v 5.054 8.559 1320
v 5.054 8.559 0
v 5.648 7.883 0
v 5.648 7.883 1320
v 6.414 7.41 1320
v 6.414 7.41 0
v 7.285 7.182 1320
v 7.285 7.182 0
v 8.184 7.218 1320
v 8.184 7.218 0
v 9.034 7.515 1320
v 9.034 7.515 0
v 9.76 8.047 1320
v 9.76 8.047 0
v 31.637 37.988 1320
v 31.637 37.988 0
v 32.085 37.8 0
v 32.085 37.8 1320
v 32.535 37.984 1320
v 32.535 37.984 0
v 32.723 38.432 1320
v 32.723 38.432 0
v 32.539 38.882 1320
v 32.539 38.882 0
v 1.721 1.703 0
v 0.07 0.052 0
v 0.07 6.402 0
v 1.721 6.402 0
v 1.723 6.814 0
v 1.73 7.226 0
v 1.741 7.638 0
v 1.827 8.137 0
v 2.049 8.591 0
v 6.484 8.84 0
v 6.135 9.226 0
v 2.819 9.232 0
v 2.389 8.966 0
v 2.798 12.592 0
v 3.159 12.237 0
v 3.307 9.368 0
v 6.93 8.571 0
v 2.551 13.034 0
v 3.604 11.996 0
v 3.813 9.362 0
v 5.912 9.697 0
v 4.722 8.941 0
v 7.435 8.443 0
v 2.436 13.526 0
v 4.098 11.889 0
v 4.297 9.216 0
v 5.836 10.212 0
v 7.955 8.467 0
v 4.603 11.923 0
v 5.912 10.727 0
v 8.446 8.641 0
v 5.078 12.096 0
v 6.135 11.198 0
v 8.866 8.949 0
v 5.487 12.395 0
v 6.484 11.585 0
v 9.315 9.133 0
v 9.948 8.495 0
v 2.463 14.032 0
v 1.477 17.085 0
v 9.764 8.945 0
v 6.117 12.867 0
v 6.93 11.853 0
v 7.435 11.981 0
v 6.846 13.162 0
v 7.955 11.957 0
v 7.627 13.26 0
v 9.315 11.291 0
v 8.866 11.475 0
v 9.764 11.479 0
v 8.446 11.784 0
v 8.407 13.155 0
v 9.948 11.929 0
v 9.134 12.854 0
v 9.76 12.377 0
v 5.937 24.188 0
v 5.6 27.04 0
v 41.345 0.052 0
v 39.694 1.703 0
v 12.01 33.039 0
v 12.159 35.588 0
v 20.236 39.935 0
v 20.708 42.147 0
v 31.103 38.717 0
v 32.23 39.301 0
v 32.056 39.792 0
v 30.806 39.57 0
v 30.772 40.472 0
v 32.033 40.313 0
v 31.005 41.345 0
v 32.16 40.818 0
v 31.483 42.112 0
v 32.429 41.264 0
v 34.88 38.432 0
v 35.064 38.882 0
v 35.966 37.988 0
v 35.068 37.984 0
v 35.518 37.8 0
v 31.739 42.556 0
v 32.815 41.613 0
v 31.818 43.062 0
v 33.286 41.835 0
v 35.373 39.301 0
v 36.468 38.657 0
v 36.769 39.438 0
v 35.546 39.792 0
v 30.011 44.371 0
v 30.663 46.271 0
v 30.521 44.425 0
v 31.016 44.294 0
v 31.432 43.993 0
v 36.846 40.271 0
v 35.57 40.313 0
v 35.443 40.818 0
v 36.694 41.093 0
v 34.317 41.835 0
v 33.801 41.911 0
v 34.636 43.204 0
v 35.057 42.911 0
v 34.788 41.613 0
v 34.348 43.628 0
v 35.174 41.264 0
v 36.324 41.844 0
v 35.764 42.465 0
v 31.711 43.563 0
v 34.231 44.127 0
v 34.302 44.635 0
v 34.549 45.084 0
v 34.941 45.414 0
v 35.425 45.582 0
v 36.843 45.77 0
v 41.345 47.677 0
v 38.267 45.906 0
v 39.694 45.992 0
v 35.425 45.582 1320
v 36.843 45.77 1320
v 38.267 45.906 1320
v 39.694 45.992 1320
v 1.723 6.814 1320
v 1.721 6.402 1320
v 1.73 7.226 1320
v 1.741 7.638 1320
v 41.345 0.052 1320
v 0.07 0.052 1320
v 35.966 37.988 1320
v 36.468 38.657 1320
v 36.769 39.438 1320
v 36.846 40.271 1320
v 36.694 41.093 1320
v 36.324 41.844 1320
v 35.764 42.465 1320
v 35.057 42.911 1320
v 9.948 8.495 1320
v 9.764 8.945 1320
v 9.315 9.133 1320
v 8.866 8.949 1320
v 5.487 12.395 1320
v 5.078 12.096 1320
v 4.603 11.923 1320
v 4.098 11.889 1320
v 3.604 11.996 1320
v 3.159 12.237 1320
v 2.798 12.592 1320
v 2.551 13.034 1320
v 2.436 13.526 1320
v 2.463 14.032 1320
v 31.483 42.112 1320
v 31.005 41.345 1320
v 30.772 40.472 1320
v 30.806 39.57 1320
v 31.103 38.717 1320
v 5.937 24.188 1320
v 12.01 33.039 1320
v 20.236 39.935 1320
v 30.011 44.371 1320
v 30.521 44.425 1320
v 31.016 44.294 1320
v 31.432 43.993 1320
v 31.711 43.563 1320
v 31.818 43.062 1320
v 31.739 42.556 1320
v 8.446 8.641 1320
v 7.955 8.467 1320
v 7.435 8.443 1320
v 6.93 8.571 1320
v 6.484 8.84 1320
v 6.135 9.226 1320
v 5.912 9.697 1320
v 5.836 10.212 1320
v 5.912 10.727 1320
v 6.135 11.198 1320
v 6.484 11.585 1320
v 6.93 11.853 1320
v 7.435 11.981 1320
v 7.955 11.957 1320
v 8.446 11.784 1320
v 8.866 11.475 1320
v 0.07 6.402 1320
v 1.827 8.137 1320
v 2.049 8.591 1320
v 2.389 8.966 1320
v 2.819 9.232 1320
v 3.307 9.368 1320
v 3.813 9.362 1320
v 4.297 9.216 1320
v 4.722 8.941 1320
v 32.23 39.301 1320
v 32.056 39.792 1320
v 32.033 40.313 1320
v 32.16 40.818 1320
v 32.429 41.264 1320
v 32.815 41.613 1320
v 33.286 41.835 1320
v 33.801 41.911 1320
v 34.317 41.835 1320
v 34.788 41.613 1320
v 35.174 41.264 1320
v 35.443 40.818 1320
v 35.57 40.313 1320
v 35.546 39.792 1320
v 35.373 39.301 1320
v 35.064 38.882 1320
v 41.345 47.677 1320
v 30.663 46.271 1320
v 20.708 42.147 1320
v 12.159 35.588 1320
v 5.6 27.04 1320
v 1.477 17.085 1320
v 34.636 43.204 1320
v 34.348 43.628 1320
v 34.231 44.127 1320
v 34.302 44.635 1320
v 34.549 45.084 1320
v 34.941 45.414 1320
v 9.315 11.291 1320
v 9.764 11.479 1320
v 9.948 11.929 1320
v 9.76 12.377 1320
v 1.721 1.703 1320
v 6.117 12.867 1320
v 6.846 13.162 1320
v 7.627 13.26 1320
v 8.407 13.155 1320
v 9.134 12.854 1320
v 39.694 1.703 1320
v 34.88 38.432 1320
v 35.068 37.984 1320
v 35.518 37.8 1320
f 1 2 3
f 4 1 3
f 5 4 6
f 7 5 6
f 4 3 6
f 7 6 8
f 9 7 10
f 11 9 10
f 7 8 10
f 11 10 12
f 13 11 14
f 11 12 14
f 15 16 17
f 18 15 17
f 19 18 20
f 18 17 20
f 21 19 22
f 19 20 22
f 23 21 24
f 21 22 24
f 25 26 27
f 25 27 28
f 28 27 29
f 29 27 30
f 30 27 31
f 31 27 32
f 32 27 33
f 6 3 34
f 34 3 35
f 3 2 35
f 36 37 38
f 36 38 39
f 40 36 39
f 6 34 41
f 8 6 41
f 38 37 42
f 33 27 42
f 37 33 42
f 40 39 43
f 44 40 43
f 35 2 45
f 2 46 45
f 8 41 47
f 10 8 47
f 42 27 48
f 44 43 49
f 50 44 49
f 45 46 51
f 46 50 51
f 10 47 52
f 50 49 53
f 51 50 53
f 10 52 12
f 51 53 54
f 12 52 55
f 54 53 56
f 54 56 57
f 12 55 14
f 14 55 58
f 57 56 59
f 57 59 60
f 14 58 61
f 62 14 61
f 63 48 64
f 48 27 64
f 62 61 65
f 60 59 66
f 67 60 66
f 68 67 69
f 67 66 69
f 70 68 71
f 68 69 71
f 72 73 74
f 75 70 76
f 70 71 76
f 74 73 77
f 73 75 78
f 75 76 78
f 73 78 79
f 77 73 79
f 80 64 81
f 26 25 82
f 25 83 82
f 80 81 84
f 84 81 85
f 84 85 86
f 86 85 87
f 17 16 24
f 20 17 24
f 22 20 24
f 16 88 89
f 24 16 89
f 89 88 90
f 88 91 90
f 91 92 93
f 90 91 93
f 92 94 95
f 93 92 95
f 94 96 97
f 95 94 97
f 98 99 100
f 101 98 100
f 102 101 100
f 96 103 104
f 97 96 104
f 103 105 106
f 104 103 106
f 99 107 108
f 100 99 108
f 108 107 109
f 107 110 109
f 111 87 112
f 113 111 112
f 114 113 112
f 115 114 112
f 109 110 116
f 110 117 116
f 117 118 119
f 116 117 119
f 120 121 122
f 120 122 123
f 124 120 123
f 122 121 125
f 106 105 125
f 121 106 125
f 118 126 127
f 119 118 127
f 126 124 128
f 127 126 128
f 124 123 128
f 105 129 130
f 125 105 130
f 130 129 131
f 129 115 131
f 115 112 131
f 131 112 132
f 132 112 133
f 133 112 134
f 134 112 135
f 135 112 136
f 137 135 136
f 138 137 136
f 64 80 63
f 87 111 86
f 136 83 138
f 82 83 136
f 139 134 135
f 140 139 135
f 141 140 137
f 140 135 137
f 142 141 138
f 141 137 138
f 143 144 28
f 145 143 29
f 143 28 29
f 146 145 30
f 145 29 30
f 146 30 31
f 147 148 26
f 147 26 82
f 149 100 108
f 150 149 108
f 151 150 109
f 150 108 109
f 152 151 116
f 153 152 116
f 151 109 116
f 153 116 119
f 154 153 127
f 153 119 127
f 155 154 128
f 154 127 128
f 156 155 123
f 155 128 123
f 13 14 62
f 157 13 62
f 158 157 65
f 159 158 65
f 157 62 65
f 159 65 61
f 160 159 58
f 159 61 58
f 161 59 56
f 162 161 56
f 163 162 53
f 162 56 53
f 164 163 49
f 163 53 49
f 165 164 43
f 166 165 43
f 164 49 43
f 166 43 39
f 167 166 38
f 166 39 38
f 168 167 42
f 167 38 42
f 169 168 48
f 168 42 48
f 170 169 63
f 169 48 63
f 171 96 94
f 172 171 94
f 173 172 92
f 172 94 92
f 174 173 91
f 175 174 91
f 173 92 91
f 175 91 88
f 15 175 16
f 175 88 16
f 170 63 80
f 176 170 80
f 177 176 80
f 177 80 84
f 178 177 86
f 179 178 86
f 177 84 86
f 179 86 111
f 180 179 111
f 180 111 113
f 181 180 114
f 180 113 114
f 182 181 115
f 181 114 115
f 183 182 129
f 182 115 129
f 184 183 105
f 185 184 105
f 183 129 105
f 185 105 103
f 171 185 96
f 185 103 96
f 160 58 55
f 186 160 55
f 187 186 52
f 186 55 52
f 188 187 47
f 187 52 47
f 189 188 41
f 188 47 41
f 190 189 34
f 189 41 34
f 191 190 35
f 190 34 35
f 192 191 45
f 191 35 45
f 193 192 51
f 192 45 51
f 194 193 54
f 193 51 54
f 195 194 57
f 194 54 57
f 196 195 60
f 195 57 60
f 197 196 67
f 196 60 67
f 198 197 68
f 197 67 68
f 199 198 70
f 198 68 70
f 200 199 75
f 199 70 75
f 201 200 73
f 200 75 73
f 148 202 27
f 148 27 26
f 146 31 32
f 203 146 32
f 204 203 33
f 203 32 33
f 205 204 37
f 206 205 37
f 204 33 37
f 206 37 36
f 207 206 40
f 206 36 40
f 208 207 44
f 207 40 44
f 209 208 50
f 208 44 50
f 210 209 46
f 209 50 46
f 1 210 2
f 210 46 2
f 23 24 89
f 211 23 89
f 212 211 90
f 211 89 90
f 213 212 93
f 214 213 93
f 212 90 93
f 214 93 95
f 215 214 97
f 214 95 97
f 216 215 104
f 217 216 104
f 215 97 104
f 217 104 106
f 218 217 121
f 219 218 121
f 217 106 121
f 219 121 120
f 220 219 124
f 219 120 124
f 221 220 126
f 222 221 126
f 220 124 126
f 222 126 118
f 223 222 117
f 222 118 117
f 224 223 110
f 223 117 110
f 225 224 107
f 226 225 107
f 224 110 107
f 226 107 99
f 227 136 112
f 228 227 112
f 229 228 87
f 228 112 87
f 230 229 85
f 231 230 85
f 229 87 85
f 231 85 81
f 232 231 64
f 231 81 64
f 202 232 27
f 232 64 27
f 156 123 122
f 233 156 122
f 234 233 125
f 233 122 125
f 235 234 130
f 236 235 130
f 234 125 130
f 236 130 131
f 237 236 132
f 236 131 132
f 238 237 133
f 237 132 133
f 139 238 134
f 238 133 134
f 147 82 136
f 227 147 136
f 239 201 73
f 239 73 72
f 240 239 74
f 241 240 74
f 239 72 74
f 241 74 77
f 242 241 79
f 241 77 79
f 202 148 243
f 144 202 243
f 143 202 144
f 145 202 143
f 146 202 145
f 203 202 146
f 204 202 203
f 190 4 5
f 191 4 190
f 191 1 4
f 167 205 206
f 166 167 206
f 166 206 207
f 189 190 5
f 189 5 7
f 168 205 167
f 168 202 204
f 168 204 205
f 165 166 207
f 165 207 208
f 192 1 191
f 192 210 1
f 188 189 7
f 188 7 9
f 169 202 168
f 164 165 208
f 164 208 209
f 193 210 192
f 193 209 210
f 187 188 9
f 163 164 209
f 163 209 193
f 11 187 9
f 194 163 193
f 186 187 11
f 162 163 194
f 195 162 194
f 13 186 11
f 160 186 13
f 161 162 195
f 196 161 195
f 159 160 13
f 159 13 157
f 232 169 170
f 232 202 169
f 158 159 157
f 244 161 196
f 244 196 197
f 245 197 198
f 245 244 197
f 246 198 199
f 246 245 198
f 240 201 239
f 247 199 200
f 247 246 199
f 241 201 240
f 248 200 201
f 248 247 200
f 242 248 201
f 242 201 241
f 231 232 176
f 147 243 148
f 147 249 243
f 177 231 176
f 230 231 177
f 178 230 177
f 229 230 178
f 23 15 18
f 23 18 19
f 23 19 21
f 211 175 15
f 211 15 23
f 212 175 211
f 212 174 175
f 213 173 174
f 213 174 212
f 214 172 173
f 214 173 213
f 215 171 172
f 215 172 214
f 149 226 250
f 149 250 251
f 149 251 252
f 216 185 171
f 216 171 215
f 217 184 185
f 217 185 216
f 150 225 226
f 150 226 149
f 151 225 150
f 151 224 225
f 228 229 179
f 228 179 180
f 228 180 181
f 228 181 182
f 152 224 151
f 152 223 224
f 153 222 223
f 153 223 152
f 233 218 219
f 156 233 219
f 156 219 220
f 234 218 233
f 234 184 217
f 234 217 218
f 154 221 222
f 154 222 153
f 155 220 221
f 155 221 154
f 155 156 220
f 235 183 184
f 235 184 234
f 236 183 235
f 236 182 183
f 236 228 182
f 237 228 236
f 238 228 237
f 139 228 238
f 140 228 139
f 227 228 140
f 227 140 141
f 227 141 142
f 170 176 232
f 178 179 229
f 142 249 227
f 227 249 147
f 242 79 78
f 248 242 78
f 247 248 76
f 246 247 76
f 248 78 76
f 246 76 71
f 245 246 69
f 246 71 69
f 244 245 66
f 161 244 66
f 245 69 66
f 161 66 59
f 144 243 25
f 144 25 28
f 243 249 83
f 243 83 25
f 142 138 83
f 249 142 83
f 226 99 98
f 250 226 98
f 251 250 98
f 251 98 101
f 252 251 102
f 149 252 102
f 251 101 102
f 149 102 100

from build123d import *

# Parameters (mm, degrees)
F1_DEPTH = 1320


# Not quite as in the source:
# - ends of sketch curves that miss each other by under 0.0002 mm in the source are joined


with BuildPart() as f1:
    # F0 (on Top) → F1 (new body)
    with BuildSketch(Plane.XY):
        with BuildLine():
            Line((0.0702818, 6.4022224), (0.0702818, 0.0522224))
            Line((0.0702818, 0.0522224), (41.3452818, 0.0522224))
            Line((41.3452818, 0.0522224), (41.3452818, 47.6772224))
            ThreePointArc((41.3452818, 47.6772224), (12.1594494065, 35.5880547935), (0.0702818, 6.4022224))
        make_face()
        with BuildLine():
            ThreePointArc((2.4627294682, 14.0316719322), (12.0103779586, 33.0391289887), (30.0113989636, 44.370689262))
            ThreePointArc((30.0113989636, 44.370689262), (31.5911647015, 43.7909818691), (31.4826885527, 42.111702976))
            ThreePointArc((31.4826885527, 42.111702976), (30.7556005021, 40.0197952956), (31.6365393769, 37.9878855663))
            ThreePointArc((31.6365393769, 37.9878855663), (32.5345549665, 37.9838460356), (32.5385935644, 38.8818625665))
            ThreePointArc((32.5385935644, 38.8818625665), (33.8014907398, 41.9114224), (35.0643565086, 38.8818507998))
            ThreePointArc((35.0643565086, 38.8818507998), (35.0683832335, 37.9838460356), (35.9663997644, 37.9878846335))
            ThreePointArc((35.9663997644, 37.9878846335), (36.7987348031, 40.6872982302), (35.056647343, 42.9109867034))
            ThreePointArc((35.056647343, 42.9109867034), (34.2431436666, 44.3840647436), (35.4254562981, 45.581518551))
            ThreePointArc((35.4254562981, 45.581518551), (37.5543147935, 45.8444579497), (39.6942825983, 45.9918116582))
            Line((39.6942825983, 45.9918116582), (39.6942818, 1.7032224))
            Line((39.6942818, 1.7032224), (1.7212818, 1.7032224))
            Line((1.7212818, 1.7032224), (1.7212818, 6.4022224))
            ThreePointArc((1.7212818, 6.4022224), (1.7261013466, 7.0202160926), (1.7405588141, 7.6380594495))
            ThreePointArc((1.7405588141, 7.6380594495), (3.0583454152, 9.3170447758), (5.0535040361, 8.5588069696))
            ThreePointArc((5.0535040361, 8.5588069696), (7.2847284354, 7.1820688789), (9.7596313332, 8.0472925626))
            ThreePointArc((9.7596313332, 8.0472925626), (9.7636581644, 8.9453209665), (8.8656416335, 8.9493595644))
            ThreePointArc((8.8656416335, 8.9493595644), (5.8360818, 10.2122134602), (8.8656407007, 11.4751096943))
            ThreePointArc((8.8656407007, 11.4751096943), (9.7636581644, 11.4791492335), (9.7596195665, 12.3771657644))
            ThreePointArc((9.7596195665, 12.3771657644), (7.6269060344, 13.2601954214), (5.4868384376, 12.3951423887))
            ThreePointArc((5.4868384376, 12.3951423887), (3.3728152631, 12.1010480384), (2.4627294682, 14.0316719322))
        make_face(mode=Mode.SUBTRACT)
    extrude(amount=F1_DEPTH)


solid = f1.part
